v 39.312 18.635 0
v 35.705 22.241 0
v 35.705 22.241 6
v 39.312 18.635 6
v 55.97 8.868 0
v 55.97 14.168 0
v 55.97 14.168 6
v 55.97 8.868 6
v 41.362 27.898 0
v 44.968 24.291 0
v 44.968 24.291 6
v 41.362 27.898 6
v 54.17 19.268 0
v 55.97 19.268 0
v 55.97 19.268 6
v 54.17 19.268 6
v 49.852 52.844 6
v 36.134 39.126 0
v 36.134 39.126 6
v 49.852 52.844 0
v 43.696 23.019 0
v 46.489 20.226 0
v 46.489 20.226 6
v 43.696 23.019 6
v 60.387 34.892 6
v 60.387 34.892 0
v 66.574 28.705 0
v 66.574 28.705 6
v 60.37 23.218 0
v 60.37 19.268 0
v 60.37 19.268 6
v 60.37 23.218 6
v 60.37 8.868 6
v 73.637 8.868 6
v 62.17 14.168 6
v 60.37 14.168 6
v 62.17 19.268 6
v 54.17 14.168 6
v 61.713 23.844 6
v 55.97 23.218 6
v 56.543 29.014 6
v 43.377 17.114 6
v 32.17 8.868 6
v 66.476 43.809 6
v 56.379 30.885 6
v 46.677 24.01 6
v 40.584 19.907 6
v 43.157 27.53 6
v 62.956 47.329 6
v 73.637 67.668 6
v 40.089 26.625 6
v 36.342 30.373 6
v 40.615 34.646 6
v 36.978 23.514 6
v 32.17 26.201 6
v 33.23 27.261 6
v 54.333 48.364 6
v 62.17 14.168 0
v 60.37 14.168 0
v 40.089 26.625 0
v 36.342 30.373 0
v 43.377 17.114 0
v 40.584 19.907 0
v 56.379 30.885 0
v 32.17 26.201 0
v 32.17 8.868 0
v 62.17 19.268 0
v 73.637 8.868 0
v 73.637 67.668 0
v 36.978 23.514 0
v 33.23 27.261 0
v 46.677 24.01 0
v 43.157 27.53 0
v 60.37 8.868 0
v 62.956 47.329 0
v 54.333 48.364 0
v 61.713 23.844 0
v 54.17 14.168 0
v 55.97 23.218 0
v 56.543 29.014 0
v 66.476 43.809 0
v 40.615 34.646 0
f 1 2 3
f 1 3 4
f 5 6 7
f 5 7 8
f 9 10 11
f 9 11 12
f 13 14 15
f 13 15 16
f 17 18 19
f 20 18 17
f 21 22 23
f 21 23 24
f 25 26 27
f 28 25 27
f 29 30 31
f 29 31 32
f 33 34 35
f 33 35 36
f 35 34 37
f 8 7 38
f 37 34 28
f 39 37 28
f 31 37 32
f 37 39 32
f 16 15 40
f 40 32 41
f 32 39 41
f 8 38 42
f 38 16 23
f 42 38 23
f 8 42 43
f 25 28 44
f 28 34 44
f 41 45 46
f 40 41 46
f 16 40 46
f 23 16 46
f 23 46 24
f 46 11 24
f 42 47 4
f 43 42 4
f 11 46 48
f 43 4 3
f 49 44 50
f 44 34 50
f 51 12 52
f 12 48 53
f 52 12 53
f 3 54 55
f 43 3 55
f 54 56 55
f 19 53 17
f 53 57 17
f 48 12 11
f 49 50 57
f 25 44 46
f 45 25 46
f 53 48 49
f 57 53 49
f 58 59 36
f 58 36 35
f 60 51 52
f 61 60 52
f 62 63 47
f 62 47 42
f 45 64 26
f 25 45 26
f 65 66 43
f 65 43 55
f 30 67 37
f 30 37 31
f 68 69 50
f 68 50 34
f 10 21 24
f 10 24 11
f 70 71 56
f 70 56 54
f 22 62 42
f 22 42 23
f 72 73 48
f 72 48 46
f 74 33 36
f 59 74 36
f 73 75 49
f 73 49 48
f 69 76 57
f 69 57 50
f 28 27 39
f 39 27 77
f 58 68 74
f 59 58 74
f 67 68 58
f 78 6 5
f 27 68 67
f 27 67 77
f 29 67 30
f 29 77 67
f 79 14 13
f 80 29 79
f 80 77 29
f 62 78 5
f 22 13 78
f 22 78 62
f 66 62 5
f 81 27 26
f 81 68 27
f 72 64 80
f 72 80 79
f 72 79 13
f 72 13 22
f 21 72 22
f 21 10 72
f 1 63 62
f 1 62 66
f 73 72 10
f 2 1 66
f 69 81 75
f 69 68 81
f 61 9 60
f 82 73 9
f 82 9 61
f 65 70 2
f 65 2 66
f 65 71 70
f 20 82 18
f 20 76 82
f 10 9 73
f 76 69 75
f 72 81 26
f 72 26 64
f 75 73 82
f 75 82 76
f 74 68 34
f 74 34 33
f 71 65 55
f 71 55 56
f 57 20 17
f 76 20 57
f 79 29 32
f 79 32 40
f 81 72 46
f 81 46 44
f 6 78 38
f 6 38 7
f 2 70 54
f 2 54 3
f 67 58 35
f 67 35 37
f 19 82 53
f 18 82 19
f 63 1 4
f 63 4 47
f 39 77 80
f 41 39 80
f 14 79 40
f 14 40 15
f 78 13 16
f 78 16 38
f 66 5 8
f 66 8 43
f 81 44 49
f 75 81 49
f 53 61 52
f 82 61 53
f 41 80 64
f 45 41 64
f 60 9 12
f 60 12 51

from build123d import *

# Parameters (mm, degrees)
RESSALTO_EXTRUS_O1_DEPTH = 6


with BuildPart() as part:
    # Model → Ressalto-extrusão1 (new body)
    with BuildSketch(Plane.XY):
        Polygon((36.978091014, 23.513650985), (35.70530016, 22.240860131), (39.311542875, 18.634617416), (40.584333729, 19.90740827), (43.377405166, 17.114336834), (46.488678057, 20.225609725), (43.695606621, 23.018681162), (44.968397475, 24.291472016), (41.36215476, 27.897714731), (40.089363906, 26.624923877), (36.341699099, 30.372588684), (40.614784991, 34.645674576), (36.134425304, 39.126034262), (49.852292818, 52.843901776), (54.332652505, 48.36354209), (73.636667559, 67.667557144), (73.636667559, 8.867561848), (60.3697662, 8.867561848), (60.3697662, 14.167560246), (62.169764288, 14.167560246), (62.169764288, 19.267557602), (60.3697662, 19.267557602), (60.3697662, 23.217557109), (55.96976188, 23.217557109), (55.96976188, 19.267557602), (54.169763792, 19.267557602), (54.169763792, 14.167560246), (55.96976188, 14.167560246), (55.96976188, 8.867561848), (32.16976612, 8.867561848), (32.16976612, 26.200655705), (33.230426207, 27.261315792), align=None)
        Polygon((60.386985649, 34.892299852), (66.57416949, 28.705116012), (61.712810758, 23.84375728), (56.542974359, 29.013593679), (56.37928278, 30.884596983), align=None, mode=Mode.SUBTRACT)
        Polygon((46.676618489, 24.010359591), (66.475606779, 43.80934788), (62.956288895, 47.328665763), (43.157300606, 27.529677474), align=None, mode=Mode.SUBTRACT)
    extrude(amount=RESSALTO_EXTRUS_O1_DEPTH)


solid = part.part
